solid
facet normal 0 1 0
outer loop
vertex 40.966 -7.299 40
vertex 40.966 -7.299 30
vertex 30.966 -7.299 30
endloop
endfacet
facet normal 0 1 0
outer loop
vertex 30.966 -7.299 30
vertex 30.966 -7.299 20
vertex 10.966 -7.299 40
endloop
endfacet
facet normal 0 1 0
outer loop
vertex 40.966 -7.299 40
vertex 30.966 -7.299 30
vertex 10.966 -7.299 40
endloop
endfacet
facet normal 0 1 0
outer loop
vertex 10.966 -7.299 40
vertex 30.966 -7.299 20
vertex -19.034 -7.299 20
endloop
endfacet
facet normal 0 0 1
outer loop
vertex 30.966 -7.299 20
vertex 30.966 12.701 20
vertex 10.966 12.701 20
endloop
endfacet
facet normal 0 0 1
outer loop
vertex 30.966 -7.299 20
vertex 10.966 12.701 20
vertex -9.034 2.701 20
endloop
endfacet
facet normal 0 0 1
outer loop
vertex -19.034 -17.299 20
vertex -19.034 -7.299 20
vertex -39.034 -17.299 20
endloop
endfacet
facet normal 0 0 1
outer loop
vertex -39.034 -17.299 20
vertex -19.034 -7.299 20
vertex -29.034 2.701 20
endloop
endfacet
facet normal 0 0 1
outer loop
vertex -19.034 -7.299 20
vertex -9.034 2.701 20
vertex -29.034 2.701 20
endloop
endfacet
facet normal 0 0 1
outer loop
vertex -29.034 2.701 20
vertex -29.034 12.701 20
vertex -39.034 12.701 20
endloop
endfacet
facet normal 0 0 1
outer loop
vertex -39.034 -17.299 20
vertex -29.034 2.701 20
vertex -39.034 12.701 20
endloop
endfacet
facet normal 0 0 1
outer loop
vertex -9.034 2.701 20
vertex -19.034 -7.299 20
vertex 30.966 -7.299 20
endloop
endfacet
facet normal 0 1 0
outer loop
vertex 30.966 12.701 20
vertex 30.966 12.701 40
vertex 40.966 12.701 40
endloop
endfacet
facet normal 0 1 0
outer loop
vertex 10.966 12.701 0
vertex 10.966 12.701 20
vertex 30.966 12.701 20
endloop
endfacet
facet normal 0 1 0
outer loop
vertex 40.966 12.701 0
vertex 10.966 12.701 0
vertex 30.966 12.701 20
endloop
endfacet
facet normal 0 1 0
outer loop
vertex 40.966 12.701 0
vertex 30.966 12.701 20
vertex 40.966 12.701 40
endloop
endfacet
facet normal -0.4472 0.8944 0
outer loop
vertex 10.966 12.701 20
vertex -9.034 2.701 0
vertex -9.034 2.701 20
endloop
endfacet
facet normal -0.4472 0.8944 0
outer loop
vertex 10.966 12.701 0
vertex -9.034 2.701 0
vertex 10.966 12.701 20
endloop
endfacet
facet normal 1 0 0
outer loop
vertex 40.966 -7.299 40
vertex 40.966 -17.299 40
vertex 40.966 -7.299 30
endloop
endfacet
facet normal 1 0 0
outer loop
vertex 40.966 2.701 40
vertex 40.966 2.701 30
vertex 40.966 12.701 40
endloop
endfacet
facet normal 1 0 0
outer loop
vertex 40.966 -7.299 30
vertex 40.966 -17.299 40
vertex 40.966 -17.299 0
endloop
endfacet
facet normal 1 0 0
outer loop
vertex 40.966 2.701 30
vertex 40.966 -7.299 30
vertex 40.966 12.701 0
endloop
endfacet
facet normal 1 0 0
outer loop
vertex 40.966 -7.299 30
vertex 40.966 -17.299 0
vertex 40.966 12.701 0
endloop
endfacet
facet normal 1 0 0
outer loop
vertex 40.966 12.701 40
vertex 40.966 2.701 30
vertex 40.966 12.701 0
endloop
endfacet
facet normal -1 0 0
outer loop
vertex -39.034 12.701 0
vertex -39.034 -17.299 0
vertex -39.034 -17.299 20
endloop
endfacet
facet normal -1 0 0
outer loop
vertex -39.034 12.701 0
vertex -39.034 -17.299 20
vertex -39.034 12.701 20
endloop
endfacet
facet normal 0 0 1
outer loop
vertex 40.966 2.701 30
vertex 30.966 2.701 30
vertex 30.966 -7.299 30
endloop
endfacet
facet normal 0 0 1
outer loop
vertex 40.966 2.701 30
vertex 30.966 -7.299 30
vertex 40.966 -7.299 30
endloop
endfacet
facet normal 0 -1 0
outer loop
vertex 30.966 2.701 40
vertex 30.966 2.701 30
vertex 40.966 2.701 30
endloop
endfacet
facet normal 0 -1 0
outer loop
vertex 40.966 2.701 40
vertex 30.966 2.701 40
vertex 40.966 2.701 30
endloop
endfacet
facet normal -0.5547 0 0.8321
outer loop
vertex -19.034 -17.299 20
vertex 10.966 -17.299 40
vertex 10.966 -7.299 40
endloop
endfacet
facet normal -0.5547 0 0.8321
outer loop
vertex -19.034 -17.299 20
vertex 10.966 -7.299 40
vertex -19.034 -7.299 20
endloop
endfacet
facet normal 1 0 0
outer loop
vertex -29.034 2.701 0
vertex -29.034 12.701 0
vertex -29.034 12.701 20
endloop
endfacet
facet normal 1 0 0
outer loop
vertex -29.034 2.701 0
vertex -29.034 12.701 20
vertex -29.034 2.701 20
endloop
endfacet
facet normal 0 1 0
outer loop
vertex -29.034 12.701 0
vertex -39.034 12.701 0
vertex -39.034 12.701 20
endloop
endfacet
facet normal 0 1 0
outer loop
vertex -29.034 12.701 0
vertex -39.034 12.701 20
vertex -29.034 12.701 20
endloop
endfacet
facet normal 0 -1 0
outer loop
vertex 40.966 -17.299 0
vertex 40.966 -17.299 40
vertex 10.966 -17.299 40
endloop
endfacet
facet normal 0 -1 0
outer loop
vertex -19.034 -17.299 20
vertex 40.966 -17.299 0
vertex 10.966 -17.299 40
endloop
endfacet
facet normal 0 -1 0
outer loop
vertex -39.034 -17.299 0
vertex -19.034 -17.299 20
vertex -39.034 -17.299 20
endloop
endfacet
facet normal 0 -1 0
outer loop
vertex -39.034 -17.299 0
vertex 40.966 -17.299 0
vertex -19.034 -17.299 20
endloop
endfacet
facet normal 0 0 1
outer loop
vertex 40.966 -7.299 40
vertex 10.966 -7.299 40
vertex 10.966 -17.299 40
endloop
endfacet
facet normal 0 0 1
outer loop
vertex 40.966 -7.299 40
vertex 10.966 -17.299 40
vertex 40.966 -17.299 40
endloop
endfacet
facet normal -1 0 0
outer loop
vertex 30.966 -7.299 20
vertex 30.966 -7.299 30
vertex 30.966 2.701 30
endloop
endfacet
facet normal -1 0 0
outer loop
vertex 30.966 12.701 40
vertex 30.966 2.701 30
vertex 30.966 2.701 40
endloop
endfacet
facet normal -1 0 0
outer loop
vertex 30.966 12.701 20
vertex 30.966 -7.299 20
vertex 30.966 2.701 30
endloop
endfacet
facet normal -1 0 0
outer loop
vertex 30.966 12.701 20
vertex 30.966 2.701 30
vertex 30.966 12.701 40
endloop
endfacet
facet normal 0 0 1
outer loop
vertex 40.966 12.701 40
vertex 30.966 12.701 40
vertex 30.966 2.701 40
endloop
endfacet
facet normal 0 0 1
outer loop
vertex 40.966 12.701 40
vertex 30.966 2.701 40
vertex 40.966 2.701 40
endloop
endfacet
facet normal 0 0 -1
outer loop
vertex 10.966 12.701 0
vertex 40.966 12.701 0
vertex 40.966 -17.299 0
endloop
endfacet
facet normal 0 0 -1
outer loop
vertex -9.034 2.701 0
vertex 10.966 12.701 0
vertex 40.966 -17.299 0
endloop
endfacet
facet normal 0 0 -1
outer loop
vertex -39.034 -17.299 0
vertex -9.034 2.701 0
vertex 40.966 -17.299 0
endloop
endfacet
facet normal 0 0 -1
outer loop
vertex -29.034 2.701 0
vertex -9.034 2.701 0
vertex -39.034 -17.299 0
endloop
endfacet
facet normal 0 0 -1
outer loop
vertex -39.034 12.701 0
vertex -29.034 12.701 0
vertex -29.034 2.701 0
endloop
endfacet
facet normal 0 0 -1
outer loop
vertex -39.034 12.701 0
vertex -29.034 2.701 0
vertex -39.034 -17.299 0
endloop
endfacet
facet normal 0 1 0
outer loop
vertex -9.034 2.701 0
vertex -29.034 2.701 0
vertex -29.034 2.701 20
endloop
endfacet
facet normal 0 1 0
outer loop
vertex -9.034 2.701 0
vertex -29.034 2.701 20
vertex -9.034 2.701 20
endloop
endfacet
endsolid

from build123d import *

# Parameters (mm, degrees)
BOSS_EXTRUDE1_DEPTH = 20
SKETCH2_W           = 30
SKETCH2_H           = 10
BOSS_EXTRUDE2_DEPTH = 20
BOSS_EXTRUDE3_DEPTH = 10
SKETCH4_W           = 10
SKETCH4_H           = 20
BOSS_EXTRUDE4_DEPTH = 10
SKETCH5_W           = 10
SKETCH5_H           = 10
BOSS_EXTRUDE5_DEPTH = 10


with BuildPart() as part:
    # Sketch1 → Boss-Extrude1 (new body)
    with BuildSketch(Plane.XY):
        Polygon((-29.033595627, 12.701314612), (-29.033595627, 2.701314612), (-9.033595627, 2.701314612), (10.966404373, 12.701314612), (40.966404373, 12.701314612), (40.966404373, -17.298685388), (-39.033595627, -17.298685388), (-39.033595627, 12.701314612), align=None)
    extrude(amount=BOSS_EXTRUDE1_DEPTH)

    # Sketch2 → Boss-Extrude2 (add)
    with BuildSketch(Plane.XY.offset(20)):
        with Locations((25.966404373, -12.298685388)):
            Rectangle(SKETCH2_W, SKETCH2_H)
    extrude(amount=BOSS_EXTRUDE2_DEPTH)

    # Sketch3 → Boss-Extrude3 (add)
    with BuildSketch(Plane(origin=(0, -17.298685388, 0), x_dir=(-1, 0, 0), z_dir=(0, -1, 0))):
        Polygon((-10.966404373, -40), (19.033595627, -20), (-10.966404373, -20), align=None)
    extrude(amount=-BOSS_EXTRUDE3_DEPTH)

    # Sketch4 → Boss-Extrude4 (add)
    with BuildSketch(Plane.XY.offset(20)):
        with Locations((35.966404373, 2.701314612)):
            Rectangle(SKETCH4_W, SKETCH4_H)
    extrude(amount=BOSS_EXTRUDE4_DEPTH)

    # Sketch5 → Boss-Extrude5 (add)
    with BuildSketch(Plane.XY.offset(30)):
        with Locations((35.966404373, 7.701314612)):
            Rectangle(SKETCH5_W, SKETCH5_H)
    extrude(amount=BOSS_EXTRUDE5_DEPTH)


solid = part.part
